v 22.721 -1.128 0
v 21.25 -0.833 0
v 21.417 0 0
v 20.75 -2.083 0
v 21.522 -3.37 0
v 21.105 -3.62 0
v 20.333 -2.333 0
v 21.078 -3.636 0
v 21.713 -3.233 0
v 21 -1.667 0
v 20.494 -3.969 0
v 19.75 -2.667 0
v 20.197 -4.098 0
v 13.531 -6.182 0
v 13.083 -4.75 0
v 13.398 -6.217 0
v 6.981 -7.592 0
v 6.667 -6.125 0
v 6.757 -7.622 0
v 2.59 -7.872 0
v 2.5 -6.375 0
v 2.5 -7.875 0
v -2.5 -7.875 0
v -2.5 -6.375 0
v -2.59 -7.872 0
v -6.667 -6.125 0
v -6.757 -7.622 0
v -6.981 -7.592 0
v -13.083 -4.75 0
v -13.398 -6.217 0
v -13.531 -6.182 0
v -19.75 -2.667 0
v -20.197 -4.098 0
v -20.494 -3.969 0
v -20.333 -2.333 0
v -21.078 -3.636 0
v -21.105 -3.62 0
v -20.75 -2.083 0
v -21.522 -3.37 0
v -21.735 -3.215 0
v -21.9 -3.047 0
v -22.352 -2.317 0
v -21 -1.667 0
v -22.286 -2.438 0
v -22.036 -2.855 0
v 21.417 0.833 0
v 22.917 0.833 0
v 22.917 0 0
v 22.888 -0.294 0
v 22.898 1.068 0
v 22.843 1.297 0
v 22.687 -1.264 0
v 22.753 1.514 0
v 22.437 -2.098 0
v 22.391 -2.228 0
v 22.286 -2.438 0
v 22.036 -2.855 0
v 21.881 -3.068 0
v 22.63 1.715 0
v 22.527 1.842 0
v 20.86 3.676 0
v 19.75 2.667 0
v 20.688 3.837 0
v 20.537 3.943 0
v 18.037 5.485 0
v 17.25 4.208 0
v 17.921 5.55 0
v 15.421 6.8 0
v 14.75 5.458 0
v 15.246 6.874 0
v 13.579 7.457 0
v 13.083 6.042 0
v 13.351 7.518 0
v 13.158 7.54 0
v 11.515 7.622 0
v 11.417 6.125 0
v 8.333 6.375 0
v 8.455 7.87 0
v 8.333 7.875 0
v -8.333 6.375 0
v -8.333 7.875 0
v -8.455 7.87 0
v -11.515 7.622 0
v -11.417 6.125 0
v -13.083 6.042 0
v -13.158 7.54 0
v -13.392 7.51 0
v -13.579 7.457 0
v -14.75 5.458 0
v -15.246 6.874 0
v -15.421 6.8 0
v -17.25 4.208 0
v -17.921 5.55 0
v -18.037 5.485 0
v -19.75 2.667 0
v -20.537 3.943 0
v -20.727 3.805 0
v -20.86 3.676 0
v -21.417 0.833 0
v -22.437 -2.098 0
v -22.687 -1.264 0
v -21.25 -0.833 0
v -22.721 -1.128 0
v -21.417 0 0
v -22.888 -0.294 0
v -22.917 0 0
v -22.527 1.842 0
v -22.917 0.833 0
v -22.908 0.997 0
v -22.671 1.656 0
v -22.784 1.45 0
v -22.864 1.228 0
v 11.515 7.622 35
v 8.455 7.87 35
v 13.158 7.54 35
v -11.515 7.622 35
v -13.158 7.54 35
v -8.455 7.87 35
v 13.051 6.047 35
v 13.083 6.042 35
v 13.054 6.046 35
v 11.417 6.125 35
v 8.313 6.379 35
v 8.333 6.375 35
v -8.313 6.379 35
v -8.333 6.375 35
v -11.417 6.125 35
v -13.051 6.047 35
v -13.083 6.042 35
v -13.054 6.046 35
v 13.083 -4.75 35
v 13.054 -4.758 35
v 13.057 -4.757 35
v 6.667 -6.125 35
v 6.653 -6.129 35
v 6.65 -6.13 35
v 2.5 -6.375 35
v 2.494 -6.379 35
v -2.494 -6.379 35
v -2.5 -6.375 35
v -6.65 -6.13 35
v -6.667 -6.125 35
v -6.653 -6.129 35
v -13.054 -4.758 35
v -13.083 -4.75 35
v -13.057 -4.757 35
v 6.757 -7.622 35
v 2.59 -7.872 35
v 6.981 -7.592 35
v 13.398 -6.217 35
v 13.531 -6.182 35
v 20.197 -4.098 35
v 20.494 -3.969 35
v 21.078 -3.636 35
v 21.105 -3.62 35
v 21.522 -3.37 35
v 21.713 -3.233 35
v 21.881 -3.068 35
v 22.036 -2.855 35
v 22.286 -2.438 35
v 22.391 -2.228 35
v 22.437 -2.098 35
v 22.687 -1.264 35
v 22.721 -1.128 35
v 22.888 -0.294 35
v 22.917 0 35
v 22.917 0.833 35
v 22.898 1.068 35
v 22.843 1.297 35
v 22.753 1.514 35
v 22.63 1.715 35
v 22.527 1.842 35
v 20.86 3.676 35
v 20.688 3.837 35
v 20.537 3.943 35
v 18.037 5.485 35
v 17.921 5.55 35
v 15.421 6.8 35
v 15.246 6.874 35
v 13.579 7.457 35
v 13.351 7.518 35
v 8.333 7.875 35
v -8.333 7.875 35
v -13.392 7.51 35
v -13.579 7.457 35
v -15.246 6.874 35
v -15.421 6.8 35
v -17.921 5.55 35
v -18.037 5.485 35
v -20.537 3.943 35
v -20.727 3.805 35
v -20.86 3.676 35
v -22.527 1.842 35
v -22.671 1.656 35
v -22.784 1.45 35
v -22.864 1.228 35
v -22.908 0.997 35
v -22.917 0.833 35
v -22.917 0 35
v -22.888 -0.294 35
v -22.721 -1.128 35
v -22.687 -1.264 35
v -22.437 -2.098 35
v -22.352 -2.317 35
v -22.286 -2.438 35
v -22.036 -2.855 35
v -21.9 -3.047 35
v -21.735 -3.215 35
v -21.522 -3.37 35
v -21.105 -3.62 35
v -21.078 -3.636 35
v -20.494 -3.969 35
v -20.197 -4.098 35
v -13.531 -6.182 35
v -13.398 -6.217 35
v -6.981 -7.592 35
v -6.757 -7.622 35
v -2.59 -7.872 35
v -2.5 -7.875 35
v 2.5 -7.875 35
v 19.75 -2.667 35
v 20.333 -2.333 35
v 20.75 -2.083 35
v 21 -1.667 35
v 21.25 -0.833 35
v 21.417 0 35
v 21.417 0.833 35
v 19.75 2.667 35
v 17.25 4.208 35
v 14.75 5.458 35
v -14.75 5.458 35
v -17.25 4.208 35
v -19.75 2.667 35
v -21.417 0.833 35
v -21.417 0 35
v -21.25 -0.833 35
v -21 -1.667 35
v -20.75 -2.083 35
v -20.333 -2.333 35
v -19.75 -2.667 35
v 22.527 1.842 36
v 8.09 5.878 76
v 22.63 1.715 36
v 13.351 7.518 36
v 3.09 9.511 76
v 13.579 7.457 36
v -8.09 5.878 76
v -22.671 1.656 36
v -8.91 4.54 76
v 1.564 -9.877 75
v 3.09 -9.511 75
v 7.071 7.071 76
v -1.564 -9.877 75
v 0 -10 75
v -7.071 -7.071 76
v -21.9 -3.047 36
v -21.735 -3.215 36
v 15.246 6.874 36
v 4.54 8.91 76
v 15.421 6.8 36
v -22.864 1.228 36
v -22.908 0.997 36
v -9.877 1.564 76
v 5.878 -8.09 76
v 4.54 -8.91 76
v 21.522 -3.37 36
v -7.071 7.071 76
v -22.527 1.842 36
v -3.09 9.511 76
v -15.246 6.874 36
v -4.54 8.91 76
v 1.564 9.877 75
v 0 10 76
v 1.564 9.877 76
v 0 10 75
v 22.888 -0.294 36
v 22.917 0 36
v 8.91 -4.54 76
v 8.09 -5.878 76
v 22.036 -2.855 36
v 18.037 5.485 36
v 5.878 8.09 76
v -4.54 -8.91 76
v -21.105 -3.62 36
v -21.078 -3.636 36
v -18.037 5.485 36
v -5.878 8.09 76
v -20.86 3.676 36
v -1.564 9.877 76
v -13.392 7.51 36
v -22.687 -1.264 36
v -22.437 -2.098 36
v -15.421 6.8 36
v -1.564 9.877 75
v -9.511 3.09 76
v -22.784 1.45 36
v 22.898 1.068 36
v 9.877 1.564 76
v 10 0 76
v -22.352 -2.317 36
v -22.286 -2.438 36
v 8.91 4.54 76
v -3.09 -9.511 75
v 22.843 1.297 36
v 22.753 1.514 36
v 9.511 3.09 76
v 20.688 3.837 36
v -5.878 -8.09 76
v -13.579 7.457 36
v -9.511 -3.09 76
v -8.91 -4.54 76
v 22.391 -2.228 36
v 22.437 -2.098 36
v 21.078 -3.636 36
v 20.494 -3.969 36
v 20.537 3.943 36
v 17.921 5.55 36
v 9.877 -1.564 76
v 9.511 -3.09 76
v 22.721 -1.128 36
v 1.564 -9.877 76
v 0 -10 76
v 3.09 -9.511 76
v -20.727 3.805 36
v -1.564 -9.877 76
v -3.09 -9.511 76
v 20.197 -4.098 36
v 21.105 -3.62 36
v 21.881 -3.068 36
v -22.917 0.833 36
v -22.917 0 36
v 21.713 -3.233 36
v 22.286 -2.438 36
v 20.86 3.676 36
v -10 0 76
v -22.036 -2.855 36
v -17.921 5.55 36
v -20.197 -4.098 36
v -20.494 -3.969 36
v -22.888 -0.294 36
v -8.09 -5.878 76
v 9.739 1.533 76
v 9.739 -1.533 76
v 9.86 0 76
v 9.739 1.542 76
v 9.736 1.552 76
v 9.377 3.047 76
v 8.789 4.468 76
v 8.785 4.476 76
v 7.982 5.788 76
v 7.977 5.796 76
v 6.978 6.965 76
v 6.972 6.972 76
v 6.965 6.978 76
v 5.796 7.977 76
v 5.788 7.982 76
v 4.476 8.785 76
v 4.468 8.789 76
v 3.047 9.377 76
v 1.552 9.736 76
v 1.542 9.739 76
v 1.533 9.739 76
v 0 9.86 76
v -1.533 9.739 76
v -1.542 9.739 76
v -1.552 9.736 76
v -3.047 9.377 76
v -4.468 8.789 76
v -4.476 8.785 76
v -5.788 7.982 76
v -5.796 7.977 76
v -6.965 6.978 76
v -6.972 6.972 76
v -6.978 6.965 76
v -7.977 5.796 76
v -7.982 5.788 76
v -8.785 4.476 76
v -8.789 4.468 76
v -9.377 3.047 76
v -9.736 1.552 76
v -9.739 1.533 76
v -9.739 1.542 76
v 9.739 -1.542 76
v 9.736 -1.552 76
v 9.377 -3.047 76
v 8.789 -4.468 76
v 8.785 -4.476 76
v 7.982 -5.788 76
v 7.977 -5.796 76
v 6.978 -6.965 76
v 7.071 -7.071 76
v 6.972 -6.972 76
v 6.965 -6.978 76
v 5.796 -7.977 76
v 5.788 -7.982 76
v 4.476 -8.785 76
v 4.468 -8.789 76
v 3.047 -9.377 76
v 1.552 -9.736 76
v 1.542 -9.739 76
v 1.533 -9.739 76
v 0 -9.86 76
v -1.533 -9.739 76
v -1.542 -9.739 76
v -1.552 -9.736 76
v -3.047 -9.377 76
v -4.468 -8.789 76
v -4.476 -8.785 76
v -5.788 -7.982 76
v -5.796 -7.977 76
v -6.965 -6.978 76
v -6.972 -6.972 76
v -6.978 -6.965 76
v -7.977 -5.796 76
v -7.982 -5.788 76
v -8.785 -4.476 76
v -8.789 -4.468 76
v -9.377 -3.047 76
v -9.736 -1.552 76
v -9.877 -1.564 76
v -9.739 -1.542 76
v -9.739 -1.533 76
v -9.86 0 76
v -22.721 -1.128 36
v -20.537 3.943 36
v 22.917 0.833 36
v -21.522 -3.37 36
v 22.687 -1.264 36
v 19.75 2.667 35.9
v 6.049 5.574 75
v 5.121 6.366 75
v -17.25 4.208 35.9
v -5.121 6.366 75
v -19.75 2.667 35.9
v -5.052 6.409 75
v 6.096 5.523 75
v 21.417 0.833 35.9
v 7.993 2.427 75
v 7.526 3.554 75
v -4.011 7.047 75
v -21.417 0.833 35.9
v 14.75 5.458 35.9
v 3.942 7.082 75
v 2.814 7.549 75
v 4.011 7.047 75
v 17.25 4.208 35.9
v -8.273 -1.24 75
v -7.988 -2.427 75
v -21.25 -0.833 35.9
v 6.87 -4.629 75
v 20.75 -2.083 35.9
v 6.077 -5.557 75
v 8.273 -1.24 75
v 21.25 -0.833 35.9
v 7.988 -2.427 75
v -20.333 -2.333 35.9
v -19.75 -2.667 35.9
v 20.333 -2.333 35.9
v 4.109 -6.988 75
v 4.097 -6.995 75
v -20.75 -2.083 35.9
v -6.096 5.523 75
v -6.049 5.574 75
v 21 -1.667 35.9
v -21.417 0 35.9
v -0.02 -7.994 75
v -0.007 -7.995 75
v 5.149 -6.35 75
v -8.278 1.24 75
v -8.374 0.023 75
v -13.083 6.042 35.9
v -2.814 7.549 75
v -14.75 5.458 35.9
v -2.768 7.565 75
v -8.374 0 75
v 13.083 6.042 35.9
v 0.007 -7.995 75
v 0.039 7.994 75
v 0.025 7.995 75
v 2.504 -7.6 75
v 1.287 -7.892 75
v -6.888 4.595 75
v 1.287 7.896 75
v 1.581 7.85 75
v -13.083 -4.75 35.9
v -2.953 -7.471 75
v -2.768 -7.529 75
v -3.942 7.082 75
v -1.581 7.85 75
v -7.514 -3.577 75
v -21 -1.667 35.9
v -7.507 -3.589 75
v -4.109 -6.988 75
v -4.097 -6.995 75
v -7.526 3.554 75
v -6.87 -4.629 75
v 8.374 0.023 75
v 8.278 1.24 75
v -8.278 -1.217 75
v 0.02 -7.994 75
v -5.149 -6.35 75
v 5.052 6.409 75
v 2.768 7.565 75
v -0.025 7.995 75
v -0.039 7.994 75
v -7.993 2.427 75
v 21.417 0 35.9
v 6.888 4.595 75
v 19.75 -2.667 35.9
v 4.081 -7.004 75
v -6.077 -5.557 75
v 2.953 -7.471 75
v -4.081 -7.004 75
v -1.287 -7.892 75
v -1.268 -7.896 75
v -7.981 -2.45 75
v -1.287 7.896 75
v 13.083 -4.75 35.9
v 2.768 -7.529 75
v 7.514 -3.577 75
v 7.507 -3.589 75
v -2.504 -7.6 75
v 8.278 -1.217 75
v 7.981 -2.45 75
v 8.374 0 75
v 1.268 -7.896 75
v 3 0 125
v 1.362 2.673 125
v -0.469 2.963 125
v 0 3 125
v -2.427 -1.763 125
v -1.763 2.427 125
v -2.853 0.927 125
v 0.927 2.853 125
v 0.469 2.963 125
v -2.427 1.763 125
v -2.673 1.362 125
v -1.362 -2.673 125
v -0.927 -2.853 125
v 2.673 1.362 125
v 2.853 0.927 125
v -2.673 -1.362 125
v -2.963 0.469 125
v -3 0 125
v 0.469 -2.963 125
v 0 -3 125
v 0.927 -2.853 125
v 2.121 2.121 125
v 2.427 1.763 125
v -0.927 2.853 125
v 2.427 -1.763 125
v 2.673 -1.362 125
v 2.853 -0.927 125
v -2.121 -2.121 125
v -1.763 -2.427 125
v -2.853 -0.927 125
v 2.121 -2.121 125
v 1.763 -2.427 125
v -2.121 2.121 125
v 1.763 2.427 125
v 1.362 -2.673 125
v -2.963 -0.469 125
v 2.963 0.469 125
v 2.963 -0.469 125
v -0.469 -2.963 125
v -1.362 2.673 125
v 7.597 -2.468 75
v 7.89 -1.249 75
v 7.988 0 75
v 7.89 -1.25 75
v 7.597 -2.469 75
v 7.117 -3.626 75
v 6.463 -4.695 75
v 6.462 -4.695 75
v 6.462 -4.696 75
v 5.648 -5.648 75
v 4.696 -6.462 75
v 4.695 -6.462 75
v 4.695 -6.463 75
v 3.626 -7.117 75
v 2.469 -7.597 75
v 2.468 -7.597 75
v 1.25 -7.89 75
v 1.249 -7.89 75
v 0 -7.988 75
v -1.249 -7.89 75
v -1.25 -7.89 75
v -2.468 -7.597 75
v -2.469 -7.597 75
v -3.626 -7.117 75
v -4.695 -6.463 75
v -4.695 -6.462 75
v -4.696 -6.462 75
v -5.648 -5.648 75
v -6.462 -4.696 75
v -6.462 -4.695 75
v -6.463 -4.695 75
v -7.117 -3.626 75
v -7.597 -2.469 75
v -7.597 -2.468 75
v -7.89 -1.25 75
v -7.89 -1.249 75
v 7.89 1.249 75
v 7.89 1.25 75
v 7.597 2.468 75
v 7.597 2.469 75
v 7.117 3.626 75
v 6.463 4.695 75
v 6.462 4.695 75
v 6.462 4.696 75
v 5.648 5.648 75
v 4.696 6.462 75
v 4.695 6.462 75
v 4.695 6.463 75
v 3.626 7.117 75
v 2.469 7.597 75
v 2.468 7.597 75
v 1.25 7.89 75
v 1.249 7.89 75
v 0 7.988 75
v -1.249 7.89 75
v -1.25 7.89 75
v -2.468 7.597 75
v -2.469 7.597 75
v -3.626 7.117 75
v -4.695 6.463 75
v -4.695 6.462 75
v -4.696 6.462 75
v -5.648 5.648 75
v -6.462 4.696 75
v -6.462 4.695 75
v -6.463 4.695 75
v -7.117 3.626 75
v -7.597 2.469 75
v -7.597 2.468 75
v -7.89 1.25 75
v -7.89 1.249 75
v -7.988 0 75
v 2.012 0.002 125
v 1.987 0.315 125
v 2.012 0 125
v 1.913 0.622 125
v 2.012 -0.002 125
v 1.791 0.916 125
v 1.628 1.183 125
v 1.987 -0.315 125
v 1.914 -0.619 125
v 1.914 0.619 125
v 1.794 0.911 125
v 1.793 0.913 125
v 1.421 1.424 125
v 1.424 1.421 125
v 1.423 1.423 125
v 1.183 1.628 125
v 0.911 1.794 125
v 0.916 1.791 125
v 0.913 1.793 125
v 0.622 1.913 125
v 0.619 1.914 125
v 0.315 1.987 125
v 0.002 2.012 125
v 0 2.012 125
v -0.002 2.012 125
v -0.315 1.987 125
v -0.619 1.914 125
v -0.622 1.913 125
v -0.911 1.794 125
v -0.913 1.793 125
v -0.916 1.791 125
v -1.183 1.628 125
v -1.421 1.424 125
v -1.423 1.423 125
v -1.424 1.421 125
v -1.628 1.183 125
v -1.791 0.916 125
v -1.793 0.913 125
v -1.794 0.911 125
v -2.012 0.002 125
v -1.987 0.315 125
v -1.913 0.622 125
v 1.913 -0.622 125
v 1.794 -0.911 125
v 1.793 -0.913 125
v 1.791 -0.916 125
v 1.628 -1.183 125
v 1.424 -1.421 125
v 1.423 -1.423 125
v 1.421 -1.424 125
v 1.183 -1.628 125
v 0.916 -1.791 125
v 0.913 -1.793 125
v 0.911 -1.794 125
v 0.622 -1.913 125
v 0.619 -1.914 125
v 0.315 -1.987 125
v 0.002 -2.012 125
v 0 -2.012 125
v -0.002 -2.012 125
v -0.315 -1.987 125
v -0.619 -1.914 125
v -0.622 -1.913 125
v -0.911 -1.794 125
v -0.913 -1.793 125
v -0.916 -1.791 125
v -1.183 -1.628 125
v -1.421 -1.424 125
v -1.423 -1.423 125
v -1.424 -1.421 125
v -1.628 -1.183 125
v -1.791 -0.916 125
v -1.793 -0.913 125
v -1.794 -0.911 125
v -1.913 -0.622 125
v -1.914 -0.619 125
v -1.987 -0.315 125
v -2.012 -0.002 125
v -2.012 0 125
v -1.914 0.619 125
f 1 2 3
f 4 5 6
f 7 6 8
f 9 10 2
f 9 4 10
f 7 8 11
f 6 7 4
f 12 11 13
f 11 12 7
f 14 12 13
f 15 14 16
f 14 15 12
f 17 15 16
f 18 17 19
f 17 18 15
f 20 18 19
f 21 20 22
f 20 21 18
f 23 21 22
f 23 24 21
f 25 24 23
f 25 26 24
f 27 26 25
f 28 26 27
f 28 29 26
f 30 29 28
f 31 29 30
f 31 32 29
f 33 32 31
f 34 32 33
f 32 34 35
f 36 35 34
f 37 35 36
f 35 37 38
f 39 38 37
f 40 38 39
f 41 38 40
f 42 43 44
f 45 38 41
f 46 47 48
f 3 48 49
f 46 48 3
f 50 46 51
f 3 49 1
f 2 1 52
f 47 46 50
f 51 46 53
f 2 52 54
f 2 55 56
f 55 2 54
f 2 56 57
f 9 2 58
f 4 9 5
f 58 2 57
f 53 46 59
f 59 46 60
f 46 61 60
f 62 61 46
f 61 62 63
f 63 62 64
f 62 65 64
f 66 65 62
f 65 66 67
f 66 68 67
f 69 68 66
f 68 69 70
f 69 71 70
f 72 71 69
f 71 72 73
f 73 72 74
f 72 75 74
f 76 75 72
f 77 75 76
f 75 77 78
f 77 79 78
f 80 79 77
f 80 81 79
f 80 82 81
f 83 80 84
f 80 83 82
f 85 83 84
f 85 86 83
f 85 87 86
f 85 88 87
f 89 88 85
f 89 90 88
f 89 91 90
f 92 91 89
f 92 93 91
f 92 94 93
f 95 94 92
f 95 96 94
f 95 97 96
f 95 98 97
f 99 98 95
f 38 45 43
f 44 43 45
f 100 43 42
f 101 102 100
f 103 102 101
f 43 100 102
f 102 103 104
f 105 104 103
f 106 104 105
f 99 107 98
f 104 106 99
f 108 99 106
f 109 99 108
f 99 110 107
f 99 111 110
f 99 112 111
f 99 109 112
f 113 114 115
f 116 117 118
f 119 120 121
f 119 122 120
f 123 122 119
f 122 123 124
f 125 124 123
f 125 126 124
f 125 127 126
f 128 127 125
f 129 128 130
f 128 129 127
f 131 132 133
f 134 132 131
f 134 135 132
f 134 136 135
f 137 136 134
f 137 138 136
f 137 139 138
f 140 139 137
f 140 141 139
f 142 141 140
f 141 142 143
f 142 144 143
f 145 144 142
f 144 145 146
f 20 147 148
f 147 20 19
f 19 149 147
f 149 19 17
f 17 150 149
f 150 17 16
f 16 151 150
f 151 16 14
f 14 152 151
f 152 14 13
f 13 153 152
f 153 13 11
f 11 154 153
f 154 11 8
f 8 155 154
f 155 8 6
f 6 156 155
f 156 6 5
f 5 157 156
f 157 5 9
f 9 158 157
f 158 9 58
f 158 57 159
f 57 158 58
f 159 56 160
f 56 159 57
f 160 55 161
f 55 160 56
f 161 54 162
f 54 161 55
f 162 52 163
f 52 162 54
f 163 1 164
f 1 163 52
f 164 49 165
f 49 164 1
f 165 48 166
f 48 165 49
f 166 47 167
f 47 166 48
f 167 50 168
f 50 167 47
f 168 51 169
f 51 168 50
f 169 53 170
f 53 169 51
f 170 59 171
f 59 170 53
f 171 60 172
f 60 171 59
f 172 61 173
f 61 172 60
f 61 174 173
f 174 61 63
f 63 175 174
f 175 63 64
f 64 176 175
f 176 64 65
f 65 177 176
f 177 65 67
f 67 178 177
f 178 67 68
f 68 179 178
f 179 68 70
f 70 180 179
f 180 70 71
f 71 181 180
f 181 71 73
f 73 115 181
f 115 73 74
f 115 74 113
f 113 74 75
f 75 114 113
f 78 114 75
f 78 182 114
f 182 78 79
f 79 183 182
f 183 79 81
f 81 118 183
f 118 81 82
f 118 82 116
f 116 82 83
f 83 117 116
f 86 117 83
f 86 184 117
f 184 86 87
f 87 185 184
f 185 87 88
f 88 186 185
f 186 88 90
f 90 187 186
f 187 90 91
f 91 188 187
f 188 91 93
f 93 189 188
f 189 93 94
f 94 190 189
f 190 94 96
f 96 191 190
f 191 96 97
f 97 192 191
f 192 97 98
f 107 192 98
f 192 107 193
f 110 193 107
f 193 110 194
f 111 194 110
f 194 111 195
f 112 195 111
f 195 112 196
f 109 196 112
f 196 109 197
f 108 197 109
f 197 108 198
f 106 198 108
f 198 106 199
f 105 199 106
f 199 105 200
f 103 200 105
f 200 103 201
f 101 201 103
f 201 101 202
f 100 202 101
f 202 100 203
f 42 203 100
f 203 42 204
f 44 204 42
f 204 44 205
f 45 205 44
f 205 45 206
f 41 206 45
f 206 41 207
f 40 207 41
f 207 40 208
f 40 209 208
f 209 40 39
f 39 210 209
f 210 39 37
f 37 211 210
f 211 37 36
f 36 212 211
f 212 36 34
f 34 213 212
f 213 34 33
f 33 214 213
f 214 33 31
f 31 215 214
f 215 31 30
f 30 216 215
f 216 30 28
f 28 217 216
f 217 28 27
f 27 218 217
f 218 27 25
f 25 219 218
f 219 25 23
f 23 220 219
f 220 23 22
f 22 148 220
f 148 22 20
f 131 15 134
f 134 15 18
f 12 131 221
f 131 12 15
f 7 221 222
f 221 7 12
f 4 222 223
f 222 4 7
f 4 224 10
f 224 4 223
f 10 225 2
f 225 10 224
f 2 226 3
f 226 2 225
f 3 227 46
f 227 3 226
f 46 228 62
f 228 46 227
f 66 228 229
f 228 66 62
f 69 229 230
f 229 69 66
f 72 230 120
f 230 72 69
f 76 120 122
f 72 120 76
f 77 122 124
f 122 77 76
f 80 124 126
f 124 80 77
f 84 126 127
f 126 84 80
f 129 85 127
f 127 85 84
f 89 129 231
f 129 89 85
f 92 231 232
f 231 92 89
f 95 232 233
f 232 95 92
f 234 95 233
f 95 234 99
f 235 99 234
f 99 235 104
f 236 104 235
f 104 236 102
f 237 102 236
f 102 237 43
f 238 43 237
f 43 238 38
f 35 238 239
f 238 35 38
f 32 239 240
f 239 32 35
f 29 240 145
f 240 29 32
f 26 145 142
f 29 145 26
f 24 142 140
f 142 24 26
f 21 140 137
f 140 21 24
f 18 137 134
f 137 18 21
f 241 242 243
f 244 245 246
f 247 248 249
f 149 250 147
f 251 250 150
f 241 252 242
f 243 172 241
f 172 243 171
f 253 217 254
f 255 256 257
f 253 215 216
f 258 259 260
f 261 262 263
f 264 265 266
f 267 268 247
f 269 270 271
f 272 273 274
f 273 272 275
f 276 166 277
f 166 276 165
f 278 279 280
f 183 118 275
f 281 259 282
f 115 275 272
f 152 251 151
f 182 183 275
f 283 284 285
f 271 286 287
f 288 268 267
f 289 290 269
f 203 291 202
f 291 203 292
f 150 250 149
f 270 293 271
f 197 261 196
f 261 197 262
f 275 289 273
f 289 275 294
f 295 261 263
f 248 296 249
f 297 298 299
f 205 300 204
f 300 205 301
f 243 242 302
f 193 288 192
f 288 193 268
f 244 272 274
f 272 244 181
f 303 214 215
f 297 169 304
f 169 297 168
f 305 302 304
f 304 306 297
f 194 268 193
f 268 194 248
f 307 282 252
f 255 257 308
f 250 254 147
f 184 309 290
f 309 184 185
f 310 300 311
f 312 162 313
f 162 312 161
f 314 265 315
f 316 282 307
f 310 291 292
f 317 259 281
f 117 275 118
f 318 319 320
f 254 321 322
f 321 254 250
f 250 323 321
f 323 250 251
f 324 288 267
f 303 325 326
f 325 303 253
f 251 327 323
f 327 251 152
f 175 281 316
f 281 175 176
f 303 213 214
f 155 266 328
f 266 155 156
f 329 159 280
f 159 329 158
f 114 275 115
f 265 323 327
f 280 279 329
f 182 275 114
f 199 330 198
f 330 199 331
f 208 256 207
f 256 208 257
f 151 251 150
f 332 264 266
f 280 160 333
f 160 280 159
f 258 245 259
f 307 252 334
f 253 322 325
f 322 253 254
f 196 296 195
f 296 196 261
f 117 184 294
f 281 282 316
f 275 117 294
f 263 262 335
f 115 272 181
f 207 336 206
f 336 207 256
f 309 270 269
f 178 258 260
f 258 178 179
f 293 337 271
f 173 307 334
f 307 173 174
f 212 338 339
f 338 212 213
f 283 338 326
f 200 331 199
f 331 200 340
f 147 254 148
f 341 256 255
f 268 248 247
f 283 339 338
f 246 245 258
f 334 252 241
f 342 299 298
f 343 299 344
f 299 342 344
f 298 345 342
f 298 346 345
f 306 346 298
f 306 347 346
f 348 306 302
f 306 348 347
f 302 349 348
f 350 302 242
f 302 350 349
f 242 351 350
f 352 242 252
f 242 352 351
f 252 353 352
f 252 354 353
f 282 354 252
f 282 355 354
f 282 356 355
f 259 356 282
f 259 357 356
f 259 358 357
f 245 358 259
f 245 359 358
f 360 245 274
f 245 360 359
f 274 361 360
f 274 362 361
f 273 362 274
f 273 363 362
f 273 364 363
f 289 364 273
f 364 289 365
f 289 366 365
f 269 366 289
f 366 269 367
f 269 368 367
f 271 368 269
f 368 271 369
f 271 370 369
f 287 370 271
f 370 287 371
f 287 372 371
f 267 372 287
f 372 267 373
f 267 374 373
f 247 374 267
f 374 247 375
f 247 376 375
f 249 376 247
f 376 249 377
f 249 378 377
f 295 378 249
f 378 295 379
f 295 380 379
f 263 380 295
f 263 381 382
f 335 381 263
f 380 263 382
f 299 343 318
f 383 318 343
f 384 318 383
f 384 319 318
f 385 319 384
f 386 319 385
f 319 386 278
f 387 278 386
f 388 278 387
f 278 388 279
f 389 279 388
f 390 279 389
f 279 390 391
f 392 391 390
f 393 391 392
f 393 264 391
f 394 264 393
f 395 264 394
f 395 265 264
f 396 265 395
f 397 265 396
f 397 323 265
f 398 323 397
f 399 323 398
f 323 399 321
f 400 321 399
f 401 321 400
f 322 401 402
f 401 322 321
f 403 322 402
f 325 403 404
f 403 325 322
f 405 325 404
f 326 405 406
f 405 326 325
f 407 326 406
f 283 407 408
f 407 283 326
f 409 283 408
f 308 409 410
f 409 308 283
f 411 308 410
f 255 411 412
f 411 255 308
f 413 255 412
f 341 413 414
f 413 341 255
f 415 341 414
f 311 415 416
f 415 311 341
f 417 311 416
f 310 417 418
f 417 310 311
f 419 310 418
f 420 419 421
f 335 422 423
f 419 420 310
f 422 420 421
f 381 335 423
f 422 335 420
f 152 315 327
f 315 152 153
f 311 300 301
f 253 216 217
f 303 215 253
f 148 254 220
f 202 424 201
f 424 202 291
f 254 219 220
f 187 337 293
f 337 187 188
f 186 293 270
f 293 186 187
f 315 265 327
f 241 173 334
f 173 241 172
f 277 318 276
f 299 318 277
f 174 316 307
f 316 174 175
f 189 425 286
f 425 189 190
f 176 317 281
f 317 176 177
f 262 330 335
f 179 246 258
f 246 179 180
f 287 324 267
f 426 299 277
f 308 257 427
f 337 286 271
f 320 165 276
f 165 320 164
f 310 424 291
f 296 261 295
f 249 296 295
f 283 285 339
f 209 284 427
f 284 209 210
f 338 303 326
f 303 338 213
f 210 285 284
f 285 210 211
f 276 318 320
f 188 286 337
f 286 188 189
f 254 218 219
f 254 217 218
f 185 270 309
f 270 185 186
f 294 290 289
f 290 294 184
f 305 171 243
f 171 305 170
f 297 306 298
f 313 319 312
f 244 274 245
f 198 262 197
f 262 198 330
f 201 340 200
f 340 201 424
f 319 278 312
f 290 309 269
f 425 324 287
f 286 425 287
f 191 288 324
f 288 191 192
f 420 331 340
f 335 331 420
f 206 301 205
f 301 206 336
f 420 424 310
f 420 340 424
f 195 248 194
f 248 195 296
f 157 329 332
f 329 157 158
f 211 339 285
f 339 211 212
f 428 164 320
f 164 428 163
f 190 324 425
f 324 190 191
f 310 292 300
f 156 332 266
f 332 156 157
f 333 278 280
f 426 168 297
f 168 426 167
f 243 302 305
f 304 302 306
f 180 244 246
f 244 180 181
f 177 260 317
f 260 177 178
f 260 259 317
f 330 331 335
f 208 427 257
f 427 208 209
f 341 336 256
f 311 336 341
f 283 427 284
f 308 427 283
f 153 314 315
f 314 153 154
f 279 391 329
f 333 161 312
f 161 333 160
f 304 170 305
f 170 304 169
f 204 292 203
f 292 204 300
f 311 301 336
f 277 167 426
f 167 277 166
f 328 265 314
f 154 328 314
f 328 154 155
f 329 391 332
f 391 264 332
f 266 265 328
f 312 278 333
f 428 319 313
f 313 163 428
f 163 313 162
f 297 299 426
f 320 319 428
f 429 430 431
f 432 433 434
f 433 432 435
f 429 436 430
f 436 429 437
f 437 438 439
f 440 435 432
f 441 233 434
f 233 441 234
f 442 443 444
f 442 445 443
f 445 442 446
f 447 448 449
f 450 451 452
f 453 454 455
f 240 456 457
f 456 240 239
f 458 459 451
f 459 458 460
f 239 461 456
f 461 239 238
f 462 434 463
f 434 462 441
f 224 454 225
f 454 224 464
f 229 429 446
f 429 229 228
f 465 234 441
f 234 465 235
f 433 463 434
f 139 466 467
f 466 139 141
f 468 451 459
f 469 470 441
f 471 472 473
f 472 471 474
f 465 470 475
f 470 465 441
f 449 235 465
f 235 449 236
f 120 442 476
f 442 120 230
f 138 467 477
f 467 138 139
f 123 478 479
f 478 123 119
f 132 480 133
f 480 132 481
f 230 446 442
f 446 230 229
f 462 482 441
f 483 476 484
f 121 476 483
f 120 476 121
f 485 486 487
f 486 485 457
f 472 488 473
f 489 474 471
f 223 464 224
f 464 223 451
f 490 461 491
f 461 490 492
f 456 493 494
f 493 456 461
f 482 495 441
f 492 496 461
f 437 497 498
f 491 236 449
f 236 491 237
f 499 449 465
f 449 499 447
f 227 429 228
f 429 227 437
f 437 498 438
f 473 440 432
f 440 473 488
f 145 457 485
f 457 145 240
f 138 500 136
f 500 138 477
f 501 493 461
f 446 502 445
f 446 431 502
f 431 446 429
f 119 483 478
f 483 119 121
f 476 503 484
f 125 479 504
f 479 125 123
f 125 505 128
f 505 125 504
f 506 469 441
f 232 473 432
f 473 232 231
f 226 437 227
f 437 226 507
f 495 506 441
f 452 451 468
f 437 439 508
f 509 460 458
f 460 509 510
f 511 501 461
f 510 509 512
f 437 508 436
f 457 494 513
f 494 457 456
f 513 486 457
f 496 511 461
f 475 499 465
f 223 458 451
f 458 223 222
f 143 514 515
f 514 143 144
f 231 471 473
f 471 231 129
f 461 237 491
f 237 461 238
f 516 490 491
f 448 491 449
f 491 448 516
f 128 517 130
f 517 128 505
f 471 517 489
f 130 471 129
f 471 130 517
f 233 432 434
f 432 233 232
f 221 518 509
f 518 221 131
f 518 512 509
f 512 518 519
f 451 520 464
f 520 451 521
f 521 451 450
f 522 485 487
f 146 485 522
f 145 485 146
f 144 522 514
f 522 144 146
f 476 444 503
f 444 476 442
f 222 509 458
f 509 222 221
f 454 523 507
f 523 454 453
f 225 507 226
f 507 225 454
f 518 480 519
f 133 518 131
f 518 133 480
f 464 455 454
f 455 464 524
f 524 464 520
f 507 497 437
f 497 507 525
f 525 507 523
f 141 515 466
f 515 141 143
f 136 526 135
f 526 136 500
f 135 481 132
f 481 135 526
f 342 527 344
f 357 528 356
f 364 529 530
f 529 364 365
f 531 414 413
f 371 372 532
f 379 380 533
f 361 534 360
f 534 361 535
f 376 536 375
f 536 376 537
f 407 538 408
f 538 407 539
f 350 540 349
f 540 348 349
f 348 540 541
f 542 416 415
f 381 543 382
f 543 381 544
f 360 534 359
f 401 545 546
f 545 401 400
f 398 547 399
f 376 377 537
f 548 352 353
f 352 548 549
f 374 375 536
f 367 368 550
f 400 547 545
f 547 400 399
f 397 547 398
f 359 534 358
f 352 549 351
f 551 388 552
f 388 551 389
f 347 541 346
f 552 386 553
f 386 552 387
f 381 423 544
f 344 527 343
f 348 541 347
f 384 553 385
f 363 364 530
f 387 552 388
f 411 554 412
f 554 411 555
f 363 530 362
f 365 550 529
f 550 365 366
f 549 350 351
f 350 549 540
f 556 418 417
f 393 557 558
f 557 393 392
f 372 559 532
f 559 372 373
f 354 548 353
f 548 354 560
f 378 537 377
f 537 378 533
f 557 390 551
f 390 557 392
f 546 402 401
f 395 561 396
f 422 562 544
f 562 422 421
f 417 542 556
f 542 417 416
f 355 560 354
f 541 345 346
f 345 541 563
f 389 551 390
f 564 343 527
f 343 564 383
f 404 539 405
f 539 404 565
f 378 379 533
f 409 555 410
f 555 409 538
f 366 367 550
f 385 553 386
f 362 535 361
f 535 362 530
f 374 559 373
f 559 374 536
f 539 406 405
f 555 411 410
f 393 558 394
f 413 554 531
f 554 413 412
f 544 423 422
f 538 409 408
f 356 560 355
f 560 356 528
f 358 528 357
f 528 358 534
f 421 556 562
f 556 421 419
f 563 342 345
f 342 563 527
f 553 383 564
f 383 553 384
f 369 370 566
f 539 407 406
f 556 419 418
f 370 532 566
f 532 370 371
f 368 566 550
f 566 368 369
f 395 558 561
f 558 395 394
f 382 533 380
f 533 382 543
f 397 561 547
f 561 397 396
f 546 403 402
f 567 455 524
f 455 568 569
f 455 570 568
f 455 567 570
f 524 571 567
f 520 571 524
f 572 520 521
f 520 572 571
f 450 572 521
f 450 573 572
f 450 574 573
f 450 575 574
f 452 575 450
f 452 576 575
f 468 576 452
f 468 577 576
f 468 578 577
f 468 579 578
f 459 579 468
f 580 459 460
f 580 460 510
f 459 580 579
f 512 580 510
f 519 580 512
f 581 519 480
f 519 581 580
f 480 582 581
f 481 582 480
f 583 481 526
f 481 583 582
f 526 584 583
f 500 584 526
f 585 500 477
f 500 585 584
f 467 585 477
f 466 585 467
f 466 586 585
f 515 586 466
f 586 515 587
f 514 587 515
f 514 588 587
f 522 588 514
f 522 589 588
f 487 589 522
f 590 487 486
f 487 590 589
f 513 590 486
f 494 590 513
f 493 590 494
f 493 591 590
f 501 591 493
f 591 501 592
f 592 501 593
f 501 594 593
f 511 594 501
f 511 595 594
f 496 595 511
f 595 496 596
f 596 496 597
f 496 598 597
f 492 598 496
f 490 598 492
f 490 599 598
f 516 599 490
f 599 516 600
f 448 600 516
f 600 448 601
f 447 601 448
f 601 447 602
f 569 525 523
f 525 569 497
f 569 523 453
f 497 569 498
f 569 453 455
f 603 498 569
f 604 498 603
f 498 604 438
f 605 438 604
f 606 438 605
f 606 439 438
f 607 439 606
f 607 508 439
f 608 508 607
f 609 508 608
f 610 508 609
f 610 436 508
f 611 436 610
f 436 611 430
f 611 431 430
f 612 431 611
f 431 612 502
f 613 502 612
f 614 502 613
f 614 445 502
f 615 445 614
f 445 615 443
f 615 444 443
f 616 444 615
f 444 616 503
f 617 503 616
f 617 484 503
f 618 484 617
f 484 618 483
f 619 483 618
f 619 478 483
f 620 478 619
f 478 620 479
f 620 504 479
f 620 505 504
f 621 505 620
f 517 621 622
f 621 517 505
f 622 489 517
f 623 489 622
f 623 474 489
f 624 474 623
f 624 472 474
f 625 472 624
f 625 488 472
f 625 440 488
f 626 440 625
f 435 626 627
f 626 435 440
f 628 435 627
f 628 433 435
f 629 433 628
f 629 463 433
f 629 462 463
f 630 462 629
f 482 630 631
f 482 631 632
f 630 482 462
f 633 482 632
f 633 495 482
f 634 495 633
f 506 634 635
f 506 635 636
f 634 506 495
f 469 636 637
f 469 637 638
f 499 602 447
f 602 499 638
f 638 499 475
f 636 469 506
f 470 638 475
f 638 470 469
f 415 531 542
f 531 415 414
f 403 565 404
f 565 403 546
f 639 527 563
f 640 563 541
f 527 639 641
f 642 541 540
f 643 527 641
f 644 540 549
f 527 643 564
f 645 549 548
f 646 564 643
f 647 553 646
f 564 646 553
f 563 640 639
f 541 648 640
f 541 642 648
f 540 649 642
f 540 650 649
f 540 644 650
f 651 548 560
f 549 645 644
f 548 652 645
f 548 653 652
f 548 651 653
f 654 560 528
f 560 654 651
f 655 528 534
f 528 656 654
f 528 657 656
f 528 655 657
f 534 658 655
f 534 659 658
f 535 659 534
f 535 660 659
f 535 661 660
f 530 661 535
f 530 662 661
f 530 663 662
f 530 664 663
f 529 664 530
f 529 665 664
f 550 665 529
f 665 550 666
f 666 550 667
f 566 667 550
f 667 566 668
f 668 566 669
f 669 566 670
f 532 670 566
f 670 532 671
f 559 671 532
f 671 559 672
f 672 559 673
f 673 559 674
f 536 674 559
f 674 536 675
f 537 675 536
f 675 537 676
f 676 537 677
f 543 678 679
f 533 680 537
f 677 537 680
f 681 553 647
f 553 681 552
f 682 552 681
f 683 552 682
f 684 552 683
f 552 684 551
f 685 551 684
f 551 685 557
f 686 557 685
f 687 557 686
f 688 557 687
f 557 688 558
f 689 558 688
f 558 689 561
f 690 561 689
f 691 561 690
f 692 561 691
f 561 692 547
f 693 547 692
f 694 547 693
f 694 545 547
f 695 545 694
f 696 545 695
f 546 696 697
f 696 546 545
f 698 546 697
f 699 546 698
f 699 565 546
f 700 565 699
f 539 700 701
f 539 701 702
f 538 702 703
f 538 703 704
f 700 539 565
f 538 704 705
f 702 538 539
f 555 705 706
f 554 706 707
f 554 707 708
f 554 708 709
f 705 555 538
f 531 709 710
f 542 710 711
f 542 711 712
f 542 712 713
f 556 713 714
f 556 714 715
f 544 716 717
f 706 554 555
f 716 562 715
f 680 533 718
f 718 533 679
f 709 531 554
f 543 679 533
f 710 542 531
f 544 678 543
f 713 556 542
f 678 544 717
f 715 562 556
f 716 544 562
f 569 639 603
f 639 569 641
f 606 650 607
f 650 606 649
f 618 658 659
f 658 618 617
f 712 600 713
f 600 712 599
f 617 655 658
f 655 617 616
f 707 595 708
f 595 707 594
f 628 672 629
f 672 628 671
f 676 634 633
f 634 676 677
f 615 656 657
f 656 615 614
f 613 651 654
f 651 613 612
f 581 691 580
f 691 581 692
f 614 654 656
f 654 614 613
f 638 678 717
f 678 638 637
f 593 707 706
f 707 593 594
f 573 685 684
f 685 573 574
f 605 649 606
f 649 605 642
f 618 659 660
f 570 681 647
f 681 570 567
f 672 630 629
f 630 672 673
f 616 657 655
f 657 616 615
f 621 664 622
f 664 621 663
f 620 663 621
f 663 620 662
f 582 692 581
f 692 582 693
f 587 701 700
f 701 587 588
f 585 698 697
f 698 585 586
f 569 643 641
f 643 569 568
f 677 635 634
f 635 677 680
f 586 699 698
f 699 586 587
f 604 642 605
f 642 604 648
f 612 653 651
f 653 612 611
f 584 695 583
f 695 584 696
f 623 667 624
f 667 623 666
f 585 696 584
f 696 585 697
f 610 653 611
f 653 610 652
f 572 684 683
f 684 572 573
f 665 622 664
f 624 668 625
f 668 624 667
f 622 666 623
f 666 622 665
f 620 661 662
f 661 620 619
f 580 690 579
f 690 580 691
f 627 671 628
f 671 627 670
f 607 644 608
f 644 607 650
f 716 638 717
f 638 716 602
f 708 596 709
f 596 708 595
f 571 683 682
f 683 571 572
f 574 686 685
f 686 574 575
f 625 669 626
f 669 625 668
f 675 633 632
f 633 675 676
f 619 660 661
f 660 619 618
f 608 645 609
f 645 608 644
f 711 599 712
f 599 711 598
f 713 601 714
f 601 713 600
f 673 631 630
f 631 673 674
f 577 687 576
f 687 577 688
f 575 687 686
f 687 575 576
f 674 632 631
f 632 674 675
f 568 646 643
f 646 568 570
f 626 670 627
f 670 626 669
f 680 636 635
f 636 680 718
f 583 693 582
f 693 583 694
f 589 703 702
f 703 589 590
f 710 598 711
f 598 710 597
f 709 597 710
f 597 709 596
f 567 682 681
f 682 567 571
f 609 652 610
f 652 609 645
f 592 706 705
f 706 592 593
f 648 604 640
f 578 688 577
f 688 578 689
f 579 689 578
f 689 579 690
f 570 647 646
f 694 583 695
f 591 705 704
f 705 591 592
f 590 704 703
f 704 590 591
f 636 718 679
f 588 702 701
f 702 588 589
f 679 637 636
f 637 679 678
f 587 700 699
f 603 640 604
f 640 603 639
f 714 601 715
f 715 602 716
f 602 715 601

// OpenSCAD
$fn=40;

// Outer diameter at the tip. Max 8. 
tip_diameter = 6;

// Length of the thin tip part. Set to 0 for no tip.
tip_length = 50;

// Length of the cone part.
cone_length = 40;

// Diameter at the end of the cone.
cone_diameter = 10;

// An attachment that fits into a DustBuster[tm]
module dustbuster_outline(off, height) {
  width = 153;
  length = 514;
  half_outline = [
          [100, width/2],
          [length/2-120, width/2-3],
          [length/2-100, width/2-4],
          [length/2-80, width/2-11],
          [length/2-50, width/2-26],
          [length/2-20, 32],
          [length/2, 10],
          [length/2, 0],
          [length/2-2, -10],
          [length/2-5, -20],
          [length/2-8, -25],
          [length/2-13, -28],
          [length/2-20, -32],
          [length/2-100, -57],
          [80, -width/2+3],
          [30, -width/2]
    ];
  other_half = [for (i = [len(half_outline)-1:-1:0]) [-half_outline[i][0], half_outline[i][1]]];
  outline = concat(half_outline, other_half);
  linear_extrude(height)
    offset(off)
    union() {
      polygon(outline);
    }
}

module dustbuster_half_hull() {
  hull() {
    translate([60, 82, -10])
      cylinder(r=10, h=20);
    translate([158, -10, -10])
      intersection() {
        cylinder(d=200, h=20, $fn=50);
        translate([0,0,-50])
          cube(100);
      }
    translate([260, 4, -10])
      cylinder(d=70, h=20);
    translate([258, -20, -10])
      cylinder(d=60, h=20);
    translate([62, 105, -10])
      intersection() {
        cylinder(d=400, h=20, $fn=50);
        translate([-10,-200,0])
          cube([200, 100, 200]);
    }
    translate([52, -87, -10])
      cylinder(r=10, h=20);
  }
}

module image() {
translate([-18,1.5,0])
 surface(file = "DustBuster 1.png", center = true,
      convexity = 5);
module dustbuster_half() {
  difference() {
    dustbuster_half_hull();
    scale([.95, .9, 1.1])
      dustbuster_half_hull();
  }
}
}

module dustbuster() {
dustbuster_half();
  translate([40,0,0])
mirror() dustbuster_half();
translate([-60, 82, -10])
cube([130, 10, 20]);
translate([-10, -97, -10])
  cube([60, 10, 10]);
}

module straight_attachment(len) {
  scale([47/564, 47/564, 1])
    difference() {
      dustbuster_outline(18, len);
      translate([0,0,-1])
        dustbuster_outline(0, len+2);
    }
}

module round_attachment_outline(outline, len, radius) {
    hull() {
  scale([47/564, 47/564, 1])
      dustbuster_outline(outline, 1);
      translate([0,0,len])
        cylinder(r=radius, h=1);
    }
}

module round_attachment(length, radius) {
  difference() {
    round_attachment_outline(18, length, radius);
    translate([0,0,-0.1])
    round_attachment_outline(0, length+0.22, radius-2);
  }
}

module pointy_attachment() {
  straight_attachment(35);
  translate([0,0,35])
    round_attachment(cone_length, cone_diameter);
  if (tip_length > 0) {
    translate([0,0,35+cone_length])
      difference() {
        cylinder(r1=cone_diameter, d2=tip_diameter, h=tip_length);
        translate([0,0,-0.1])
          cylinder(r1=cone_diameter-2, d2=tip_diameter/1.5, h=tip_length+0.2);
      }
    }
  }
  
  pointy_attachment();
